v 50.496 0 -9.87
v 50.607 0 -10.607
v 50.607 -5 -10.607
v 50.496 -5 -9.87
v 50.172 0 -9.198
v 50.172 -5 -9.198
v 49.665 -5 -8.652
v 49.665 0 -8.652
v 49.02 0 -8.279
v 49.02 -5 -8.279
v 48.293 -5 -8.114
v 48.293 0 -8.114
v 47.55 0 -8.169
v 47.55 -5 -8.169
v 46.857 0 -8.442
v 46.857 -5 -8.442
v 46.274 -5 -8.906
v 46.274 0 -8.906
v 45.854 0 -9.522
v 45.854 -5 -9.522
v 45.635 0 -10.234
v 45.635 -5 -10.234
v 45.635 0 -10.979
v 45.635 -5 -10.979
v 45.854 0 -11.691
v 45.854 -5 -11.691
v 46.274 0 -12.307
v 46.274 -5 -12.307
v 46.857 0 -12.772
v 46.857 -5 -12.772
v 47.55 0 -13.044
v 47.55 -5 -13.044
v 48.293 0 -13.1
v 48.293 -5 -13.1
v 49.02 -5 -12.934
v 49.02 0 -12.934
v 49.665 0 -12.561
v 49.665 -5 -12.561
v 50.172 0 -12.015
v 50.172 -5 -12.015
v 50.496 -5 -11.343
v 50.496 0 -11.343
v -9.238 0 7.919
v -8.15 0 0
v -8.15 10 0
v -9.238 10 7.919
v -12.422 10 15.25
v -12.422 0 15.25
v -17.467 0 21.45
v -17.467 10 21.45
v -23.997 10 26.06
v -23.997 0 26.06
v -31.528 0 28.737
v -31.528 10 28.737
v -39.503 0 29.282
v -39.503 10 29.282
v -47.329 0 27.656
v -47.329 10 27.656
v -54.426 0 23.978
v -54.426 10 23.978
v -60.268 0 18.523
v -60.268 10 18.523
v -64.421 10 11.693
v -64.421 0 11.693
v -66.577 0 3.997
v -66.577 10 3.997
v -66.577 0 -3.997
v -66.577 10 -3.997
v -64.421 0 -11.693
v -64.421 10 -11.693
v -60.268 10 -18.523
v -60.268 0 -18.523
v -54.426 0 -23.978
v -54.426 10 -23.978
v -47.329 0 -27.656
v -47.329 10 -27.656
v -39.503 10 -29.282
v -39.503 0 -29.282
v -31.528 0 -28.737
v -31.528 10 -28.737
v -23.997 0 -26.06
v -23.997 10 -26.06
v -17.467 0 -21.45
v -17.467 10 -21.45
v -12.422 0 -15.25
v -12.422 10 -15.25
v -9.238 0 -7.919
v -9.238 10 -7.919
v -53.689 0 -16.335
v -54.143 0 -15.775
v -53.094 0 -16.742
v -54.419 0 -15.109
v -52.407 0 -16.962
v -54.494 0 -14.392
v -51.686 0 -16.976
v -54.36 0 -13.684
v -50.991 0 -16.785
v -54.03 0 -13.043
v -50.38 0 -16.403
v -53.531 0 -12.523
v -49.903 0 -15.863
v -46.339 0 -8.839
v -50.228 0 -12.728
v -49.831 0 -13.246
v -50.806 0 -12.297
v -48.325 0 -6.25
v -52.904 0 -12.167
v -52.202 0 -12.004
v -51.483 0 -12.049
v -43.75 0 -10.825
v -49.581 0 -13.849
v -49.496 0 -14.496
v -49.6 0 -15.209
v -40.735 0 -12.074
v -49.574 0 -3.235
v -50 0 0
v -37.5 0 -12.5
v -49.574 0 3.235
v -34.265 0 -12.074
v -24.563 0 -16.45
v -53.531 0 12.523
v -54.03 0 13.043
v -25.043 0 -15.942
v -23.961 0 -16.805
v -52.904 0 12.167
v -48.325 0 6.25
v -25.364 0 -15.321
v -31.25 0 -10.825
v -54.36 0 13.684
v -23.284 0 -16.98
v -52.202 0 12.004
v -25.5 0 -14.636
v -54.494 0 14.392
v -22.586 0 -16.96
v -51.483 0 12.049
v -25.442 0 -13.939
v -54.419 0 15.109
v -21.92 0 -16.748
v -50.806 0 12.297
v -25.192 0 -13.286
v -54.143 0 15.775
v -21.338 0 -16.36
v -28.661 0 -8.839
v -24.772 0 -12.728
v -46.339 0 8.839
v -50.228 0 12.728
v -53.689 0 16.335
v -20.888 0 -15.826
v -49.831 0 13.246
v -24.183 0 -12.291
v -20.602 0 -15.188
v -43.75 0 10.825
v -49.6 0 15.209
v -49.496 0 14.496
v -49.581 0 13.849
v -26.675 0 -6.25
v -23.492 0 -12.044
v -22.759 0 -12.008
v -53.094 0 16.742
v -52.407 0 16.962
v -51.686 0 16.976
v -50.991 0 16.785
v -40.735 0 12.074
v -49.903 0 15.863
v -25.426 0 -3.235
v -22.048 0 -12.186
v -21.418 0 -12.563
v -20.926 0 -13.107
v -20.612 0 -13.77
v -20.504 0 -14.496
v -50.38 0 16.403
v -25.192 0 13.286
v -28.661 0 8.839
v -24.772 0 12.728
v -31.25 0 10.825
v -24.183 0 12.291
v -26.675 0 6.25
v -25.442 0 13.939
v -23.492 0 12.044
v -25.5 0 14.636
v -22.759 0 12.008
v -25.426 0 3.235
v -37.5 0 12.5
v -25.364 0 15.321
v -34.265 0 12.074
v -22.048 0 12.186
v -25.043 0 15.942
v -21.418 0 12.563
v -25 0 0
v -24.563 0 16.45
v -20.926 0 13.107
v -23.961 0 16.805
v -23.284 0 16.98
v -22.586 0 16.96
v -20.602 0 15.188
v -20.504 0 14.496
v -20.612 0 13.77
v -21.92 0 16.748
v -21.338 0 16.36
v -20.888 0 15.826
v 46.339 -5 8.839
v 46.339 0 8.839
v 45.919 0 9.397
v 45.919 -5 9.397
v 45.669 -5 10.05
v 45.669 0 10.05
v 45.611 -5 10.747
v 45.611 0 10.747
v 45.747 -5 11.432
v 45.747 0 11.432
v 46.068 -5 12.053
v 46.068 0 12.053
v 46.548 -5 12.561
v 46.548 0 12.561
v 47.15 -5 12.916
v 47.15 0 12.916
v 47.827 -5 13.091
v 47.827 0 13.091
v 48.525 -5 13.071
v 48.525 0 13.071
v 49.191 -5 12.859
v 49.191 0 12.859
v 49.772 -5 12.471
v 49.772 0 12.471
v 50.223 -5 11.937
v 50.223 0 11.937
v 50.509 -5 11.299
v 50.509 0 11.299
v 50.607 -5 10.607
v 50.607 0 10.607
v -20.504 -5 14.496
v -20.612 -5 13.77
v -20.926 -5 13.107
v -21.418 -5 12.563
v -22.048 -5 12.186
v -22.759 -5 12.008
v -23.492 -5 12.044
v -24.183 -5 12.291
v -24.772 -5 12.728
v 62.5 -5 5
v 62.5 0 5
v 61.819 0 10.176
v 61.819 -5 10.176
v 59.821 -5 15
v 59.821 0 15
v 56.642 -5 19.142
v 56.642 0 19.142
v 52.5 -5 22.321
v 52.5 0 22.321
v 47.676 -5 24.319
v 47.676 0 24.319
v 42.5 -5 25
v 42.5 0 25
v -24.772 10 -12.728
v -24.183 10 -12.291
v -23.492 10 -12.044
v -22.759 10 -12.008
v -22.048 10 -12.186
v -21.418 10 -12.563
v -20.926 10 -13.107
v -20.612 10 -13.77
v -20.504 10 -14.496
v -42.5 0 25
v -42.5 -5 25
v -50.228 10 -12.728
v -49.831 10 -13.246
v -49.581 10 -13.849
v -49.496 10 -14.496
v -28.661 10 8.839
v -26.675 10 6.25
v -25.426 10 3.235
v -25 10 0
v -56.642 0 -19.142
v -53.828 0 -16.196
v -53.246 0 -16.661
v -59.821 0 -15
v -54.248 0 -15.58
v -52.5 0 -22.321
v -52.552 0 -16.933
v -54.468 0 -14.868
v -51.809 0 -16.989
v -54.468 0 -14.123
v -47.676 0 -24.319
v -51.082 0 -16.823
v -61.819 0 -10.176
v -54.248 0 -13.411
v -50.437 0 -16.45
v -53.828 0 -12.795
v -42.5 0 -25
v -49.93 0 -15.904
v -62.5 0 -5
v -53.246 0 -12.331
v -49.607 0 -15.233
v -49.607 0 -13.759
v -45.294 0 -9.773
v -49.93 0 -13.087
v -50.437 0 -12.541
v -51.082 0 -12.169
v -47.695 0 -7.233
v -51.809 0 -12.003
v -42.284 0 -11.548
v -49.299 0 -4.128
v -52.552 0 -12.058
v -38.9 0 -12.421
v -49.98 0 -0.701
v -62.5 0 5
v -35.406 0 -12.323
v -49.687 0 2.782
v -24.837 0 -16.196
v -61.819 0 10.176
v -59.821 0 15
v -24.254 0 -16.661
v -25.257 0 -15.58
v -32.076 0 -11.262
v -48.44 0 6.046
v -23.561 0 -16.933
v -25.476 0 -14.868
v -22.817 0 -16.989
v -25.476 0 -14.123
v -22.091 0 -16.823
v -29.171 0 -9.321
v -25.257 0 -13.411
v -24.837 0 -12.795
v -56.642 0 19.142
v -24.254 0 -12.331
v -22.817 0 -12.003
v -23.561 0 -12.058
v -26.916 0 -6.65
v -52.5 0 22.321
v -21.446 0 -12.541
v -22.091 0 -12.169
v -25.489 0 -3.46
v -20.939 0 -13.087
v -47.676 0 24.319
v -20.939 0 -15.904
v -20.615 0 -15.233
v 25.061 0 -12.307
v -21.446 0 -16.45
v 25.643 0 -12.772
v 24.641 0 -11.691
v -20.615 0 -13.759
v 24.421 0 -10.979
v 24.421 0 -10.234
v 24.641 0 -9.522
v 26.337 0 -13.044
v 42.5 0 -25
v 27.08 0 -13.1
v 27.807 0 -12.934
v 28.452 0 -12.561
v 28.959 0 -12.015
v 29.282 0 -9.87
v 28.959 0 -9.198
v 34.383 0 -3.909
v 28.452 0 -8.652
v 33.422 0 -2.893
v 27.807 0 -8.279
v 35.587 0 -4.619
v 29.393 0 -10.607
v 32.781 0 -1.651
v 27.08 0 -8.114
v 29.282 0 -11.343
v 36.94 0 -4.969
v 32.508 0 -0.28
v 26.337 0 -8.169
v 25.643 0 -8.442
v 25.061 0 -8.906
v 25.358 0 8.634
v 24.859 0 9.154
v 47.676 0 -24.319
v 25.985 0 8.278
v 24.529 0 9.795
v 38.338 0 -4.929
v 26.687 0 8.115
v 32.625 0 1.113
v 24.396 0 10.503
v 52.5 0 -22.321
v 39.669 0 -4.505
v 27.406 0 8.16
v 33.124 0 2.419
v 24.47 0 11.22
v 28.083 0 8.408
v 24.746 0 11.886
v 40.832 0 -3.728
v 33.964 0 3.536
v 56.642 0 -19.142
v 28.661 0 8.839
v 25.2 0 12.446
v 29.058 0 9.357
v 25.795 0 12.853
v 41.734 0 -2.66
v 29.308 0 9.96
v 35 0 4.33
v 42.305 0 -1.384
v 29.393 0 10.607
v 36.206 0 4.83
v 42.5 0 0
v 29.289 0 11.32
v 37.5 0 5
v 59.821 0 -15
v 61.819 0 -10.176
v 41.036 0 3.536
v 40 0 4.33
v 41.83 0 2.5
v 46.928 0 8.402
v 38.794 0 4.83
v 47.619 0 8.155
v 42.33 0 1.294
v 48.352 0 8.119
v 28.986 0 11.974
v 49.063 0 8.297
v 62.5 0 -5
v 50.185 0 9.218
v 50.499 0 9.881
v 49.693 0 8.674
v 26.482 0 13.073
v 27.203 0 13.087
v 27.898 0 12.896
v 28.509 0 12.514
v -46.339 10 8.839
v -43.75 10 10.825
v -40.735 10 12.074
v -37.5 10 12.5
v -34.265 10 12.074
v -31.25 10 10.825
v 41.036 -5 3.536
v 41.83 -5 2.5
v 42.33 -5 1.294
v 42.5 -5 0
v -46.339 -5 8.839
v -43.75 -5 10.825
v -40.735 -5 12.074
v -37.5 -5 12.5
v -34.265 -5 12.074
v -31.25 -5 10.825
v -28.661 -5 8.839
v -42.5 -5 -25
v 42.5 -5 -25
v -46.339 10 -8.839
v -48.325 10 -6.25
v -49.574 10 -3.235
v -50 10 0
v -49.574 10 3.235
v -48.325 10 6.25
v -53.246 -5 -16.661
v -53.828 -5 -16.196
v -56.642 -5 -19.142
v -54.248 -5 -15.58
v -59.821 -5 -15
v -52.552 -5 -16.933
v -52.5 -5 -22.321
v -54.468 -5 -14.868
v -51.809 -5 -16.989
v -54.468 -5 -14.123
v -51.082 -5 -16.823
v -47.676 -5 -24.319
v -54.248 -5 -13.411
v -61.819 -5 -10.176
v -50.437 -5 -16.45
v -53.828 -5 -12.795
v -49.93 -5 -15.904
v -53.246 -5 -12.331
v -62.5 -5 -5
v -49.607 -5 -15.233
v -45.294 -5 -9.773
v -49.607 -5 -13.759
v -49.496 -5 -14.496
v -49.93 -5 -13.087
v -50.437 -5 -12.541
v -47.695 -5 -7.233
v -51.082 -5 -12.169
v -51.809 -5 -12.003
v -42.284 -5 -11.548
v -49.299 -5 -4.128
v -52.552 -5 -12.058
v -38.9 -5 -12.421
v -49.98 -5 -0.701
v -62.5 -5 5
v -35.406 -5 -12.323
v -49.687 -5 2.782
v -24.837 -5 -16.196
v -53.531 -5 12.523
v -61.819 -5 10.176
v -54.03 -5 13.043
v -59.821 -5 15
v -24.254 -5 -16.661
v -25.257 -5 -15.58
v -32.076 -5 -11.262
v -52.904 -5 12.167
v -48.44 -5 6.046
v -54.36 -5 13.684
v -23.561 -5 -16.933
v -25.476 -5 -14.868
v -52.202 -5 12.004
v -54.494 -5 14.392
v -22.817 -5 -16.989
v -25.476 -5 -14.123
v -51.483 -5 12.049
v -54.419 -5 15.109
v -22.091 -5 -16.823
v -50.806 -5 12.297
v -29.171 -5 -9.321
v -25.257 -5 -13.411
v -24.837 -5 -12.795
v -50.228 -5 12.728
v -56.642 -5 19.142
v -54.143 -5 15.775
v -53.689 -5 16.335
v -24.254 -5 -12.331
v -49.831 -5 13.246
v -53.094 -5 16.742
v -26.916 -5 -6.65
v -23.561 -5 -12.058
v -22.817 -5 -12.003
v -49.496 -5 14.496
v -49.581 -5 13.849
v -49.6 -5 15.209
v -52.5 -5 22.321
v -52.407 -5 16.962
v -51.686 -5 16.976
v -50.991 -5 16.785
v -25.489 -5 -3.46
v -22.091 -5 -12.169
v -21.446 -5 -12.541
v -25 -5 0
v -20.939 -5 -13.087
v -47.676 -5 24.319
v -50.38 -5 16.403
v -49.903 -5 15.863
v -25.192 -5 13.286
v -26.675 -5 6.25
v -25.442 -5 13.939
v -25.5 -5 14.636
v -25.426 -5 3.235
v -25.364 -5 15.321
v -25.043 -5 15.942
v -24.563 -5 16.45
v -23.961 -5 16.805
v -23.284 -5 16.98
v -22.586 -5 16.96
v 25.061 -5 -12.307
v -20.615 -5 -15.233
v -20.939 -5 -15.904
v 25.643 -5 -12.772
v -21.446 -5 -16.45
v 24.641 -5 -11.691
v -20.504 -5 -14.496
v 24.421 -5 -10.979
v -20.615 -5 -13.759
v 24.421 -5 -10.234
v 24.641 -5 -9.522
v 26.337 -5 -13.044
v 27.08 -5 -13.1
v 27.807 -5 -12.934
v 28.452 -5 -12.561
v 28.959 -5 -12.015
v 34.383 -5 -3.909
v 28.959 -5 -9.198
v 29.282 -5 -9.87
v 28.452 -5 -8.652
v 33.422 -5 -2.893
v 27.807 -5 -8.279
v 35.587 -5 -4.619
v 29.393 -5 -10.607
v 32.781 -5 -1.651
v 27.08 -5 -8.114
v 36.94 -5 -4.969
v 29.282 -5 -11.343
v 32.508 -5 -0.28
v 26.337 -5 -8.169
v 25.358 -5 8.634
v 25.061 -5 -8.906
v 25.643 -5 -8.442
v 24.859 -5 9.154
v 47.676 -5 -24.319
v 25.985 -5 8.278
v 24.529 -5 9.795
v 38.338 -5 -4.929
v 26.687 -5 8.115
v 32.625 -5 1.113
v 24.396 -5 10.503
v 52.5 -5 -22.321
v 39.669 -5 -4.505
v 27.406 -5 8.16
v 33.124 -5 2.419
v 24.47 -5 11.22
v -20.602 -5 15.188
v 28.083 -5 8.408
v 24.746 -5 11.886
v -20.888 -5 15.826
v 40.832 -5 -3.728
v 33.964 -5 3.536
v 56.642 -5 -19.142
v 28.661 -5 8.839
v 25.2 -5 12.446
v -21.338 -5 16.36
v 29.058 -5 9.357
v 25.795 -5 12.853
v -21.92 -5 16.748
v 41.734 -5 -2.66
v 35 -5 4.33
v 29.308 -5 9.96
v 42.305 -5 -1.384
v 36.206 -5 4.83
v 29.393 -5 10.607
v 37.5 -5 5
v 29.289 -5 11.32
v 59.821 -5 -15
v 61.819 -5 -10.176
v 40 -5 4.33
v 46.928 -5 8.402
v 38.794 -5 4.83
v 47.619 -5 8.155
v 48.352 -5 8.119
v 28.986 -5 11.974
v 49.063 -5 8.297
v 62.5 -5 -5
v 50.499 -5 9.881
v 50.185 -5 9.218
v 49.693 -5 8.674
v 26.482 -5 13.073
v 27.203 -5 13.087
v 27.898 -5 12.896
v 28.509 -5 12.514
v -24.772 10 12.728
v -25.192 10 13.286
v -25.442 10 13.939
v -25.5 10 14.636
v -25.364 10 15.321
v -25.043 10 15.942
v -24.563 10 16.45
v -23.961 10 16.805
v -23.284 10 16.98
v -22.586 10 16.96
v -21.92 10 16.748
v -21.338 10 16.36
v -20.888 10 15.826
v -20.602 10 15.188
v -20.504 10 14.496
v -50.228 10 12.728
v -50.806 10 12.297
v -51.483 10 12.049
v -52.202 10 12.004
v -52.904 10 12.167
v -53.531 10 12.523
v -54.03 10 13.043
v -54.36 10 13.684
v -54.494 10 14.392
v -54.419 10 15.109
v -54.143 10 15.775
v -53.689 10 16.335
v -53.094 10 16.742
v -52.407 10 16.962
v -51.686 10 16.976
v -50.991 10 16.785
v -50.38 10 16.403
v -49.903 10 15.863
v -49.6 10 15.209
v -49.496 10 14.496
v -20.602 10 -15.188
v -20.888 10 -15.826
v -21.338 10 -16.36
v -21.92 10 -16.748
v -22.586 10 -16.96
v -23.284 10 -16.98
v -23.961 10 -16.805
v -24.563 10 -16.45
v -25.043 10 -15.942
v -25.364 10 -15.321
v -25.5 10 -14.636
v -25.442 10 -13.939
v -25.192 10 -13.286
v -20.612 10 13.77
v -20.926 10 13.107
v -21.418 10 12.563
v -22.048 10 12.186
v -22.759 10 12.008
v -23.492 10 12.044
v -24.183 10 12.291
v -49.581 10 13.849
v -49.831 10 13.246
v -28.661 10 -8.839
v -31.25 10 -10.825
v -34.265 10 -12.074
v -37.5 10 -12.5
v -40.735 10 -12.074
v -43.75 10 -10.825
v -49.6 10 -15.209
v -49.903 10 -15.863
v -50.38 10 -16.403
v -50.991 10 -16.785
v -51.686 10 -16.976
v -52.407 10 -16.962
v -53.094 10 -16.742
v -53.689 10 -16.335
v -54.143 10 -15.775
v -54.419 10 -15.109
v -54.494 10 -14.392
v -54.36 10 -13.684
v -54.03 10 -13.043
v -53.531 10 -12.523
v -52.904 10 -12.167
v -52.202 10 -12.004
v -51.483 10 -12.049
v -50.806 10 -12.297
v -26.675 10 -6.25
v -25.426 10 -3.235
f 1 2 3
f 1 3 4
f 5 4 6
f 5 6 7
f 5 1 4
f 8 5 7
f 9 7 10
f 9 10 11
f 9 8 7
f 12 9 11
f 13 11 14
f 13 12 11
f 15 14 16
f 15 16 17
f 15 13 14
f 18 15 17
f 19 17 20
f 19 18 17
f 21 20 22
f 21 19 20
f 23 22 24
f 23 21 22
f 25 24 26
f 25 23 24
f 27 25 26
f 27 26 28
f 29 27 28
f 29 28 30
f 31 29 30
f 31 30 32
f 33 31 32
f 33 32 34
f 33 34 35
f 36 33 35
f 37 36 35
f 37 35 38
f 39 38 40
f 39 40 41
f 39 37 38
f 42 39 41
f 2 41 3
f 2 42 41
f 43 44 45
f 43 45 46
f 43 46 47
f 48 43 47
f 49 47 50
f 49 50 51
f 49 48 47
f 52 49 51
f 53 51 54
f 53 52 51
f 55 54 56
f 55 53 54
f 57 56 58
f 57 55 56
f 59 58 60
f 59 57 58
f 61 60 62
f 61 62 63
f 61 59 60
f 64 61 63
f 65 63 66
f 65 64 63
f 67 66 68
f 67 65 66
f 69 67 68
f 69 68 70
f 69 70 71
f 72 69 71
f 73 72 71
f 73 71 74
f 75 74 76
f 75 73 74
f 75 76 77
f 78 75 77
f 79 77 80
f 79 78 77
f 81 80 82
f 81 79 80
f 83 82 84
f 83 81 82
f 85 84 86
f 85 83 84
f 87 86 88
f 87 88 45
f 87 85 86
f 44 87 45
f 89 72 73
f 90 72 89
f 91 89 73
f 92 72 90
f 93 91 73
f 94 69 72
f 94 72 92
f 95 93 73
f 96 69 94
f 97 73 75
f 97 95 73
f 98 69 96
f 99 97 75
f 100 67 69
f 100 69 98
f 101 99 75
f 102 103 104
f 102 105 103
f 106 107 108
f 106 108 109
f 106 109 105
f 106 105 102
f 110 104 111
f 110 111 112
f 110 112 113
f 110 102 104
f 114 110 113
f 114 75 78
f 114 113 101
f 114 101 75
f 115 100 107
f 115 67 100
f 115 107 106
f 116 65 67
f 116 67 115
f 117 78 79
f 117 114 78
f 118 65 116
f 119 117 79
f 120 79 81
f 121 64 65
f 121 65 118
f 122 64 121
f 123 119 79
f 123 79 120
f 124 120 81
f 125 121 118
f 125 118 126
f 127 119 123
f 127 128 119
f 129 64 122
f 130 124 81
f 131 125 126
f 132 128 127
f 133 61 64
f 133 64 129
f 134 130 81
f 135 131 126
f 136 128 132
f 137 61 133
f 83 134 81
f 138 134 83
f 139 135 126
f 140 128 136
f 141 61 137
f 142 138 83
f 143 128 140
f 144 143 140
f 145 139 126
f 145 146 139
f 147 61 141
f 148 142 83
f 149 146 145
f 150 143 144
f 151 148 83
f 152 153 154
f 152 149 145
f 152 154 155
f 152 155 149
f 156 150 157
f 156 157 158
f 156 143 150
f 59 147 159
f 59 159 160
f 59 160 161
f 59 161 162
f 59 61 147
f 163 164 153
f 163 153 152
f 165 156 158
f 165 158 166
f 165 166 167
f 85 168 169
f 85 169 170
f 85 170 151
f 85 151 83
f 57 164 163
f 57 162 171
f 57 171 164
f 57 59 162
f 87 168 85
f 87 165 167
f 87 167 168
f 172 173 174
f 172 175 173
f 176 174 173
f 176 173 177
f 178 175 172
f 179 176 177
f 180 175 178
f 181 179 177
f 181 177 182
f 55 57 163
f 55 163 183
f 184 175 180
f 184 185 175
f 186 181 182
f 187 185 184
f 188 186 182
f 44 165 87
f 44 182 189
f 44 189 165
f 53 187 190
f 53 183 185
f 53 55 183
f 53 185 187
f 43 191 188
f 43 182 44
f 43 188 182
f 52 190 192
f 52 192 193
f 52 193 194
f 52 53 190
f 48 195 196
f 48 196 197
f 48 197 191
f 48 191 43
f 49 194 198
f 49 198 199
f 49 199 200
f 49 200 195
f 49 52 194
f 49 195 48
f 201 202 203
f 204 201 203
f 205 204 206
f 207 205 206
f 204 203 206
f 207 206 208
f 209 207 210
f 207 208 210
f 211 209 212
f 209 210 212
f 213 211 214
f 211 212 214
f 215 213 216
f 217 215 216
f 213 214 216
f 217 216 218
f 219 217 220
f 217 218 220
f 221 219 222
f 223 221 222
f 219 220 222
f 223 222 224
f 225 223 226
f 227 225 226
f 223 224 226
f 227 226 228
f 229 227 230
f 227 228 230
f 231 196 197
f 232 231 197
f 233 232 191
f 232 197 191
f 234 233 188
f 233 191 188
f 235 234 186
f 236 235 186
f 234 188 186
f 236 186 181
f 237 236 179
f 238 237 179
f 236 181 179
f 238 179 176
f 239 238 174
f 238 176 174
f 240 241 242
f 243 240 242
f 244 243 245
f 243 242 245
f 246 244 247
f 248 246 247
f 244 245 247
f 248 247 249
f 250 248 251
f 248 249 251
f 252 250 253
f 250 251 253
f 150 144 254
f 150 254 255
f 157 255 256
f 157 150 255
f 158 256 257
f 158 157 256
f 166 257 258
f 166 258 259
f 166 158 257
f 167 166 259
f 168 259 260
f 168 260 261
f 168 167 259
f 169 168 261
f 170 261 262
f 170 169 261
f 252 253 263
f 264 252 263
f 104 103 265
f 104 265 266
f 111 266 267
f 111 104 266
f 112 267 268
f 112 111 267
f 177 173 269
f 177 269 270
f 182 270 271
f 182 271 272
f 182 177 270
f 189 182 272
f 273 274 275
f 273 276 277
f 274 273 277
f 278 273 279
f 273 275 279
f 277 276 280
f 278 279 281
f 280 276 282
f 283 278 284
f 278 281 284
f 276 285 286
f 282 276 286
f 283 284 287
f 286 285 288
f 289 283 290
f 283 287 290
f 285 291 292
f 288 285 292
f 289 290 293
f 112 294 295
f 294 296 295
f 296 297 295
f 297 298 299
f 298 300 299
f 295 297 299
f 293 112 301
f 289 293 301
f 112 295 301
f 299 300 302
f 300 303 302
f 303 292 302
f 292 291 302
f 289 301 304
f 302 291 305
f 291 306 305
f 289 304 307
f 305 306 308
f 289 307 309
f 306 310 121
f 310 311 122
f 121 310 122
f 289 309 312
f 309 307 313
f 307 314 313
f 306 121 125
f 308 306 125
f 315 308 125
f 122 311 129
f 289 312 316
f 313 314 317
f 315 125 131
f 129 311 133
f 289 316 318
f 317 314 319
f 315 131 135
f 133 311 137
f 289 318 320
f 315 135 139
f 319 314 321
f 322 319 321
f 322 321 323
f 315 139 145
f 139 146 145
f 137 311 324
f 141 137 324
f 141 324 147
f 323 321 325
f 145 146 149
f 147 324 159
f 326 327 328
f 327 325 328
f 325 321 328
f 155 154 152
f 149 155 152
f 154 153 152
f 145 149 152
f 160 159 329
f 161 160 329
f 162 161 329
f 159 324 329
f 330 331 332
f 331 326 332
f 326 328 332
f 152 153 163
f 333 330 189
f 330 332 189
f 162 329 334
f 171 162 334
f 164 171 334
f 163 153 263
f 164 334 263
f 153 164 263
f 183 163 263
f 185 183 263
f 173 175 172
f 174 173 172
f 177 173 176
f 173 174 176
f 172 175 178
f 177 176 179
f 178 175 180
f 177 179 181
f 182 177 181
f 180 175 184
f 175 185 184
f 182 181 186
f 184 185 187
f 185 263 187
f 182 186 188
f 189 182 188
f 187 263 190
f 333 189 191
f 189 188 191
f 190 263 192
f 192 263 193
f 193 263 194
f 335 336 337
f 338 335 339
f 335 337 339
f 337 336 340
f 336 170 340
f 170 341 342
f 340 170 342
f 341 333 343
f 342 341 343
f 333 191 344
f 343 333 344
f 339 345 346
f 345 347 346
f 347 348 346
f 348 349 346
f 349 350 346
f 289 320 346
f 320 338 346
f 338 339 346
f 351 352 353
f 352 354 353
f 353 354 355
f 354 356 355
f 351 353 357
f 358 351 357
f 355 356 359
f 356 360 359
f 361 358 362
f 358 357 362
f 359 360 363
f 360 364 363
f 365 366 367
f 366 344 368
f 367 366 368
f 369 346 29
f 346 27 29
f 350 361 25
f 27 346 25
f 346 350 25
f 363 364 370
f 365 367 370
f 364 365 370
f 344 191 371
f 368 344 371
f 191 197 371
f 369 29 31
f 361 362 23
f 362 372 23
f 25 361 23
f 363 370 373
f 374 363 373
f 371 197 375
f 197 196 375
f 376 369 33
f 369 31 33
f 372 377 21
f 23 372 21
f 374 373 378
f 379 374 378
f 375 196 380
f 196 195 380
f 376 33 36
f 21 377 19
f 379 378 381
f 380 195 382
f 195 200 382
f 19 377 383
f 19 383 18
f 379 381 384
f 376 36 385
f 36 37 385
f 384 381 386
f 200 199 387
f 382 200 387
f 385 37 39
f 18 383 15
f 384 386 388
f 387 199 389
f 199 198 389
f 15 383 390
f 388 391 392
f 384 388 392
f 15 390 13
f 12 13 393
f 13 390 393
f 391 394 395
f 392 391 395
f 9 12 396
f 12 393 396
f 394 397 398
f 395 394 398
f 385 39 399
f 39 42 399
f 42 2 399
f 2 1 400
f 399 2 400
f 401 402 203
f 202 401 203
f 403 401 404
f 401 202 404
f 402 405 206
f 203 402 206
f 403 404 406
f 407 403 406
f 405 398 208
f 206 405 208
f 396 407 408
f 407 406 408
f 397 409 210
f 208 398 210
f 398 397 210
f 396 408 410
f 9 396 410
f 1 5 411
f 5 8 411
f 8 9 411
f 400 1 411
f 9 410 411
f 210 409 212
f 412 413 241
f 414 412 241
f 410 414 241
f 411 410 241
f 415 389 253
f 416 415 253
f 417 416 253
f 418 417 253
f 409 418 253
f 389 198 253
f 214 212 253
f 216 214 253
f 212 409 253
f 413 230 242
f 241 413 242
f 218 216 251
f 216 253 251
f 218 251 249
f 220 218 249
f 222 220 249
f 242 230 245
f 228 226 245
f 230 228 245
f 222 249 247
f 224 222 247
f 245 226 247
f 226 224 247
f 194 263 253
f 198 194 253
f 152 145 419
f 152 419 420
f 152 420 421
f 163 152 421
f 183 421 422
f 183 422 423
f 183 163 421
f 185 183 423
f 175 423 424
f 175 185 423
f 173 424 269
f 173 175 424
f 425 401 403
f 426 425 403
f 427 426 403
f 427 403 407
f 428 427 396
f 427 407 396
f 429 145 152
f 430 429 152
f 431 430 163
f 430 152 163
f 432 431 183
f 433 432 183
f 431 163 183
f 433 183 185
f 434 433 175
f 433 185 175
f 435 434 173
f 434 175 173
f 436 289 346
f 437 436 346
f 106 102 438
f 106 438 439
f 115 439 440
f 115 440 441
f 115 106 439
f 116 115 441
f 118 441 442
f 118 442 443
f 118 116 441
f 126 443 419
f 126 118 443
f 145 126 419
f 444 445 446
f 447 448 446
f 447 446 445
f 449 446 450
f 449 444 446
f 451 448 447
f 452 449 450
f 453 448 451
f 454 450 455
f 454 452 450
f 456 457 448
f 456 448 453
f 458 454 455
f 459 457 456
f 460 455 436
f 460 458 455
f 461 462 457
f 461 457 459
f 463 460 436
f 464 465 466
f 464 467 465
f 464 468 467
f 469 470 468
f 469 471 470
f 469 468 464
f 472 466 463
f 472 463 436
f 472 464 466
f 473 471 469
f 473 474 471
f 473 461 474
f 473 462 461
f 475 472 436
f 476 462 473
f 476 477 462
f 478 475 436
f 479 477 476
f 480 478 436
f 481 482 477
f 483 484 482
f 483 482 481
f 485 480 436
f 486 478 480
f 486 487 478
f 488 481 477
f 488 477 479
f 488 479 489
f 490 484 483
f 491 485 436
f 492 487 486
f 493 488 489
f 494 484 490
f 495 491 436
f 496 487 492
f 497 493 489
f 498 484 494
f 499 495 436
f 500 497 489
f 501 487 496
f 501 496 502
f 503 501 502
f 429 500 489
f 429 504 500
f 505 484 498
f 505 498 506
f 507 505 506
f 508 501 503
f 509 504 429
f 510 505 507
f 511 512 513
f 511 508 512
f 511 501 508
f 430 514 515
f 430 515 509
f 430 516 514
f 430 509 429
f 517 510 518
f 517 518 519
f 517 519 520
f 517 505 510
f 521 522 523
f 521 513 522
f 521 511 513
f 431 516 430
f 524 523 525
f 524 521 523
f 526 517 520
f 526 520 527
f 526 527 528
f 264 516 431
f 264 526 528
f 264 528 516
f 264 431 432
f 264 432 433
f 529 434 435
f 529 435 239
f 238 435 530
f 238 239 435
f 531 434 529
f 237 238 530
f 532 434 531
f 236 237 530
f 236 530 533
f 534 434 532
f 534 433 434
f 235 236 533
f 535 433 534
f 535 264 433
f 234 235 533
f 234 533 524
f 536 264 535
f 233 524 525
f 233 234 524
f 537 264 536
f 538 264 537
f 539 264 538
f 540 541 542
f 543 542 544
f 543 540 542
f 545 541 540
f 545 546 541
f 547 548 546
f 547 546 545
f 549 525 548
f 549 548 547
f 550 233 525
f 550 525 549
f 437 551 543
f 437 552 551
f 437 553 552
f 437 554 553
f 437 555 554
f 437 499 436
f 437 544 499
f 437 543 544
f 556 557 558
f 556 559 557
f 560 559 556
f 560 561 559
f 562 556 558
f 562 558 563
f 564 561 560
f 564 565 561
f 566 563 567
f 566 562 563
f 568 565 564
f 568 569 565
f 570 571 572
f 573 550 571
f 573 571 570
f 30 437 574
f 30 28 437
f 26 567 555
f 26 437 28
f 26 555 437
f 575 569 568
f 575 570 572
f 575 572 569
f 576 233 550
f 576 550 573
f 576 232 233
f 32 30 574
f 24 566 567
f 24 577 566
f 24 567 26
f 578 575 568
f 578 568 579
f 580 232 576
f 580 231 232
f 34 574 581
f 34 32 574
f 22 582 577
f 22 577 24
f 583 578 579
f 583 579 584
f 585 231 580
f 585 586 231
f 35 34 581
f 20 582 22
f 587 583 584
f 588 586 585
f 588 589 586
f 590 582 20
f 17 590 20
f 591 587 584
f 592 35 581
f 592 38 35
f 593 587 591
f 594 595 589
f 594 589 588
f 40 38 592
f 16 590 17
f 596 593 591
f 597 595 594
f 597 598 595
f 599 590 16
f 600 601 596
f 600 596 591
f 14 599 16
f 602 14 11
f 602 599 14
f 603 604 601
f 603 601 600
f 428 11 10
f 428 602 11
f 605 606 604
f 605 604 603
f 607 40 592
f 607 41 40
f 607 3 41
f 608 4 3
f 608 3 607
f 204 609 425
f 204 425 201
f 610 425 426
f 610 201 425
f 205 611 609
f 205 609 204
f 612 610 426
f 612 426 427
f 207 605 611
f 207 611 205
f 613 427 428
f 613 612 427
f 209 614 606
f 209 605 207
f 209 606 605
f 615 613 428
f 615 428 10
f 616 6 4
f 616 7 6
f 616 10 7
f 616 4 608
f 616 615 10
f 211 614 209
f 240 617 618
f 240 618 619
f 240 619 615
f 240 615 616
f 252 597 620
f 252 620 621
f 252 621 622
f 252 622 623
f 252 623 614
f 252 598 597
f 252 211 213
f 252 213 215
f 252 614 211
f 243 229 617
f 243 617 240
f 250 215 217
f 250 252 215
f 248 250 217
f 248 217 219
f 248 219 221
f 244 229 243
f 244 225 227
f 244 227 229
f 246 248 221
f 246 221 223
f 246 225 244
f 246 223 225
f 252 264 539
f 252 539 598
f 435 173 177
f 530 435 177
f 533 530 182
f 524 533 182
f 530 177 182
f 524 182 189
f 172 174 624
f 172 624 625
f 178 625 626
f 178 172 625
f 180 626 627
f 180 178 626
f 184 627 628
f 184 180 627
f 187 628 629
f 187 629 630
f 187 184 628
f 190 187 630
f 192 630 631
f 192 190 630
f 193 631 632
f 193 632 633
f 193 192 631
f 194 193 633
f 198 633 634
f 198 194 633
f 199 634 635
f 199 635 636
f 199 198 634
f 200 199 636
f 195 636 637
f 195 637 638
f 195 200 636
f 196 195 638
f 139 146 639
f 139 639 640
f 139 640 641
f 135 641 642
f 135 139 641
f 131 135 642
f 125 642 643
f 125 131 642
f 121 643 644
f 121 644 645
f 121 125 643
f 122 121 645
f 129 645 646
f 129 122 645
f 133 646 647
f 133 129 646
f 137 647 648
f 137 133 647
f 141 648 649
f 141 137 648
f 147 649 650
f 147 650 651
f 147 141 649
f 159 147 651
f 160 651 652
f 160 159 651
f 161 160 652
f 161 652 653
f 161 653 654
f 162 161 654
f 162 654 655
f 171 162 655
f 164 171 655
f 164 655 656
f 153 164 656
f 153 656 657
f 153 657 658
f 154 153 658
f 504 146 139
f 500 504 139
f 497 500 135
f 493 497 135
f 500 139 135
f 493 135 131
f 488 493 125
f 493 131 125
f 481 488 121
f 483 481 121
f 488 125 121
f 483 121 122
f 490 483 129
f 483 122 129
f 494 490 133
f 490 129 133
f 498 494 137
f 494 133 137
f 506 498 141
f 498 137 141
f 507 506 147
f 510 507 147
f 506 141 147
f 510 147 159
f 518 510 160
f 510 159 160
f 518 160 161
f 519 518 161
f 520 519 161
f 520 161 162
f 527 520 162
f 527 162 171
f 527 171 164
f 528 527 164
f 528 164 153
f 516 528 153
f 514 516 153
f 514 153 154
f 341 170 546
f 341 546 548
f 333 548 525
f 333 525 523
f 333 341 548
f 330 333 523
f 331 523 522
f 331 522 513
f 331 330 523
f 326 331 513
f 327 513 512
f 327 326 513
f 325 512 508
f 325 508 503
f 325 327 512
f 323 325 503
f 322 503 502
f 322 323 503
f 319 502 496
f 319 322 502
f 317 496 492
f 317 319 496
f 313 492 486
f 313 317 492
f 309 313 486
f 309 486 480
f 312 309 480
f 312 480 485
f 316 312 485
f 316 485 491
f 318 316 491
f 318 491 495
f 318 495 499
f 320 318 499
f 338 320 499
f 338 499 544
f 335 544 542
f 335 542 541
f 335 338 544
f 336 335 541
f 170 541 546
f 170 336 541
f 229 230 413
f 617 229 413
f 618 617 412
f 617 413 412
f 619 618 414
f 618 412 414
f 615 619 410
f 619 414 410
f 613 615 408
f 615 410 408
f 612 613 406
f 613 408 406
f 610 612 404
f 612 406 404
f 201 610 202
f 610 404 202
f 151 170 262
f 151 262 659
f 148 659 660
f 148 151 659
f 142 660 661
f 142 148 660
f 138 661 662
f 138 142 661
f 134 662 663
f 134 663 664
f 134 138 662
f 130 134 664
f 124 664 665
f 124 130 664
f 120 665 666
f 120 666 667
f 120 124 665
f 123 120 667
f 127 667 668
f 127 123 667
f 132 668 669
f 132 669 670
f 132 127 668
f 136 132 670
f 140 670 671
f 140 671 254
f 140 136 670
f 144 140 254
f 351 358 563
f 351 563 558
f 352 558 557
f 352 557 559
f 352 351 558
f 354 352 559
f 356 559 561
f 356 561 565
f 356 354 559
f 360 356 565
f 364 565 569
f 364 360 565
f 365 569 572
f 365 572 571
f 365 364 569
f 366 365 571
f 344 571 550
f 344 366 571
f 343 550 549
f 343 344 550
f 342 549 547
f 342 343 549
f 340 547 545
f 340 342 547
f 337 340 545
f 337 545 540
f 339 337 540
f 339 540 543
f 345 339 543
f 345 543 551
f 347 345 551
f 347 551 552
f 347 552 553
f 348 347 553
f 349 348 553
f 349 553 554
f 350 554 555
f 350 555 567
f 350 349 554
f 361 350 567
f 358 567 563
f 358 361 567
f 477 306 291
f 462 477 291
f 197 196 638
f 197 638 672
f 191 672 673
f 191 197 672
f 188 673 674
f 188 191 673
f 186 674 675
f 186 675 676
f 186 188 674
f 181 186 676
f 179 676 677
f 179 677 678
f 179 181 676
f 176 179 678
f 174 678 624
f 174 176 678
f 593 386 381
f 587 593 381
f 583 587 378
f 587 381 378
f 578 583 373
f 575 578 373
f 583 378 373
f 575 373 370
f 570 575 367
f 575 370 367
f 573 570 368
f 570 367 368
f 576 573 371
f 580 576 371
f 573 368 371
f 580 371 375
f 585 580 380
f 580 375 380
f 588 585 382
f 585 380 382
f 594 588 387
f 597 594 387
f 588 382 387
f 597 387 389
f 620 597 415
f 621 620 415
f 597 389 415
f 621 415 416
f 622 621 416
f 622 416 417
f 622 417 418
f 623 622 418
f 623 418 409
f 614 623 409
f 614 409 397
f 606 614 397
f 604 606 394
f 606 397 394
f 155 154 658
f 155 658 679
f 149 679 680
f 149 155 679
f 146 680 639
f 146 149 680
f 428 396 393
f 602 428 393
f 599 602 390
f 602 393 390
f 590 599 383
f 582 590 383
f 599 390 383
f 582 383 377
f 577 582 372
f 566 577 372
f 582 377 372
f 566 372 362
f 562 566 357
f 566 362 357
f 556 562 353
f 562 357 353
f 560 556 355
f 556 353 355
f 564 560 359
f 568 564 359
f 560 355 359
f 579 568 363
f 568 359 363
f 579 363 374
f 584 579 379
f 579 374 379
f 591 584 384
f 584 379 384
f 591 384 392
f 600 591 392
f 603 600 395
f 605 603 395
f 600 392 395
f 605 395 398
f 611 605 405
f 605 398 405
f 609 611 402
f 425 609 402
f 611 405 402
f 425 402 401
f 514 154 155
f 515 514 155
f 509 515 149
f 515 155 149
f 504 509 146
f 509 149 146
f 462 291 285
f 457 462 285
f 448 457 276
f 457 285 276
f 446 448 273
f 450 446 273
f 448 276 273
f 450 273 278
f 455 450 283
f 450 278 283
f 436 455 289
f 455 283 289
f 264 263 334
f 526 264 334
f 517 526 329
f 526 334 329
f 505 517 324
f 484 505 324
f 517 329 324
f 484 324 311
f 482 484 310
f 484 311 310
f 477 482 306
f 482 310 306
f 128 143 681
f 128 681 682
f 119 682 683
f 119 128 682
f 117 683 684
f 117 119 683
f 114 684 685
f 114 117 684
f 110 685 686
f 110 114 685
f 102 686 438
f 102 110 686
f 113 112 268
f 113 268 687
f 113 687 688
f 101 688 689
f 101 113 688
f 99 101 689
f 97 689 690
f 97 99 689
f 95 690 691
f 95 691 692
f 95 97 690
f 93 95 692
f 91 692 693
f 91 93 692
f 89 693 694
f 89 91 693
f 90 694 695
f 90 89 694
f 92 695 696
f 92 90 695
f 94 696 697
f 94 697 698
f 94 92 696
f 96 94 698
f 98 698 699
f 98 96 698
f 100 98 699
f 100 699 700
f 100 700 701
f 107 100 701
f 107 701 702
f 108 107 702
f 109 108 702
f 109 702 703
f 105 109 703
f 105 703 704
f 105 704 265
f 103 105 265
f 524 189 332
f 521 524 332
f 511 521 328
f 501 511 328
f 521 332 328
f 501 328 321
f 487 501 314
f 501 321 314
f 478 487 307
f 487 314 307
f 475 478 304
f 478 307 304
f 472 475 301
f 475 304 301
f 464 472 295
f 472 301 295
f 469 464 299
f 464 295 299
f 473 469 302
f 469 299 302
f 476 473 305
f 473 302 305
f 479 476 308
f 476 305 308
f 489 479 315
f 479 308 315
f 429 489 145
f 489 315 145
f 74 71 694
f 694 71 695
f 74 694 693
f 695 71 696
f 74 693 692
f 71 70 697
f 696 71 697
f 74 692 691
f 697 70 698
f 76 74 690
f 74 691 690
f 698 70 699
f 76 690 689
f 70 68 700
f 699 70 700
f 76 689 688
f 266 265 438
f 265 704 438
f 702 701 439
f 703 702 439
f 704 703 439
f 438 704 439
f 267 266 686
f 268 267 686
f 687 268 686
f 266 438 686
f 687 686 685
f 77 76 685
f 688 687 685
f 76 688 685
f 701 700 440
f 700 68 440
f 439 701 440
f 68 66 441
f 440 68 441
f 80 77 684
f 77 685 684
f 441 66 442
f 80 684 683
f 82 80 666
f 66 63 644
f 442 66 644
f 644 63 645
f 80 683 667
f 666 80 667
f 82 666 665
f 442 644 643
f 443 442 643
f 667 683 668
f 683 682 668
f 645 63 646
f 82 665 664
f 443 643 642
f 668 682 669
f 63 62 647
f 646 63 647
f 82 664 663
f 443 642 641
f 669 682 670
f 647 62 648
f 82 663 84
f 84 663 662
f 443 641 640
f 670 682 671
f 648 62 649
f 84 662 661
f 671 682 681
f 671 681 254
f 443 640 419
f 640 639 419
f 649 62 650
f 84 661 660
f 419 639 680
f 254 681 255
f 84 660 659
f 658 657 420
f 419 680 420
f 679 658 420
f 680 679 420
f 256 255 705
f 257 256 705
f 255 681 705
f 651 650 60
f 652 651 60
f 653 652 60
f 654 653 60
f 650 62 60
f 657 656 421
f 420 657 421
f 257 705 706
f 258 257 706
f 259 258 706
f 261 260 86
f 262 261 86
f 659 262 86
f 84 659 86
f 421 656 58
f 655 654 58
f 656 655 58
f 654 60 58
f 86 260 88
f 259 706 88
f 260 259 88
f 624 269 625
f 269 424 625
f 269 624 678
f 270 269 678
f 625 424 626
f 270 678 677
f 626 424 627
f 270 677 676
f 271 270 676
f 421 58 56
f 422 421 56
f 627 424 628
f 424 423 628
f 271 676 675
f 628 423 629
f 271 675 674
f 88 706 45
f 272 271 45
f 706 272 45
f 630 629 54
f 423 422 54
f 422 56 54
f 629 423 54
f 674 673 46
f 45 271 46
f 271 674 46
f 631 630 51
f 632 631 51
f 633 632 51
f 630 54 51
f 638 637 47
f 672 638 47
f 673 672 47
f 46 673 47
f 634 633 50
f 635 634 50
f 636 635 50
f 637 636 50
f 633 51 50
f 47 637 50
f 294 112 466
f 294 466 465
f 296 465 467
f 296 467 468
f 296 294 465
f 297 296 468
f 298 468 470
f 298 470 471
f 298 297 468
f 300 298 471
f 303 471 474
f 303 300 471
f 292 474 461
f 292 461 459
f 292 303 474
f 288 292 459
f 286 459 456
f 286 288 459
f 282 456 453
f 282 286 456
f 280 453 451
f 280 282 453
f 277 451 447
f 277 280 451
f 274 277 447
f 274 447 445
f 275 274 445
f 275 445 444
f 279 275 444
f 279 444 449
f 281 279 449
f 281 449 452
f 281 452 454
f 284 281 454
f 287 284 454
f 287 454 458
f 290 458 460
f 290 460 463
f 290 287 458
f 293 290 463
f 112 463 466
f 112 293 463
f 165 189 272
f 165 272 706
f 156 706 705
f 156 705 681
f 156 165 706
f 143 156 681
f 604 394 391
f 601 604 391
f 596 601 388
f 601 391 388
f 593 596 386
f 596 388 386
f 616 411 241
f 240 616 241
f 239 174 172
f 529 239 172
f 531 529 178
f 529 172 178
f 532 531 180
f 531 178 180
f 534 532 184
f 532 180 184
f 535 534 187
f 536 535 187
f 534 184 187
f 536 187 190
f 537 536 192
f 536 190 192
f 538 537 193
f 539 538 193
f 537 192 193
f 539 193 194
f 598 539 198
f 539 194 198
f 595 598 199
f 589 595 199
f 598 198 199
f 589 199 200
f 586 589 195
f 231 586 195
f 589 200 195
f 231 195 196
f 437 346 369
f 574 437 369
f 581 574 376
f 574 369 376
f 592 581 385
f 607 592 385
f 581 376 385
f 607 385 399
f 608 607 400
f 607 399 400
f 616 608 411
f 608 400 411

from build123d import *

# Parameters (mm, degrees)
F0_R     = 2.5
F1_DEPTH = 5
F2_R     = 29.3505
F3_DEPTH = 10


with BuildPart() as f1:
    # F0 (on Front) → F1 (new body)
    with BuildSketch(Plane.XZ):
        with BuildLine():
            ThreePointArc((62.5, 5), (56.6421356237, 19.1421356237), (42.5, 25))
            Line((42.5, 25), (-42.5, 25))
            ThreePointArc((-42.5, 25), (-56.6421356237, 19.1421356237), (-62.5, 5))
            Line((-62.5, 5), (-62.5, -5))
            ThreePointArc((-62.5, -5), (-56.6421356237, -19.1421356237), (-42.5, -25))
            Line((-42.5, -25), (42.5, -25))
            ThreePointArc((42.5, -25), (56.6421356237, -19.1421356237), (62.5, -5))
            Line((62.5, -5), (62.5, 5))
        make_face()
        with Locations((-51.9956890143, -14.4956890143)):
            Circle(F0_R, mode=Mode.SUBTRACT)
        with Locations((-23.0043109857, -14.4956890143)):
            Circle(F0_R, mode=Mode.SUBTRACT)
        with BuildLine():
            ThreePointArc((-25, 0), (-42.2835429046, -11.5484941564), (-46.3388347648, 8.8388347648))
            ThreePointArc((-46.3388347648, 8.8388347648), (-37.5, 12.5), (-28.6611652352, 8.8388347648))
            ThreePointArc((-28.6611652352, 8.8388347648), (-25.9515058436, 4.7835429046), (-25, 0))
        make_face(mode=Mode.SUBTRACT)
        with Locations((26.8933982822, -10.6066017178)):
            Circle(F0_R, mode=Mode.SUBTRACT)
        with Locations((48.1066017178, -10.6066017178)):
            Circle(F0_R, mode=Mode.SUBTRACT)
        with BuildLine():
            ThreePointArc((42.5, 0), (35.5865828382, -4.6193976626), (33.9644660941, 3.5355339059))
            ThreePointArc((33.9644660941, 3.5355339059), (37.5, 5), (41.0355339059, 3.5355339059))
            ThreePointArc((41.0355339059, 3.5355339059), (42.1193976626, 1.9134171618), (42.5, 0))
        make_face(mode=Mode.SUBTRACT)
        with BuildLine():
            ThreePointArc((-50.2279220614, 12.7279220614), (-54.3053878456, 15.4523975952), (-49.4956890143, 14.4956890143))
            ThreePointArc((-49.4956890143, 14.4956890143), (-49.685990183, 13.5389804334), (-50.2279220614, 12.7279220614))
        make_face(mode=Mode.SUBTRACT)
        with BuildLine():
            ThreePointArc((-20.5043109857, 14.4956890143), (-22.0476024048, 12.185990183), (-24.7720779386, 12.7279220614))
            ThreePointArc((-24.7720779386, 12.7279220614), (-23.9610195666, 16.8053878456), (-20.5043109857, 14.4956890143))
        make_face(mode=Mode.SUBTRACT)
        with BuildLine():
            ThreePointArc((28.6611652352, 8.8388347648), (24.5836994509, 11.5633102987), (29.3933982822, 10.6066017178))
            ThreePointArc((29.3933982822, 10.6066017178), (29.2030971135, 9.6498931369), (28.6611652352, 8.8388347648))
        make_face(mode=Mode.SUBTRACT)
        with BuildLine():
            ThreePointArc((50.6066017178, 10.6066017178), (49.0633102987, 8.2969028865), (46.3388347648, 8.8388347648))
            ThreePointArc((46.3388347648, 8.8388347648), (47.1498931369, 12.9163005491), (50.6066017178, 10.6066017178))
        make_face(mode=Mode.SUBTRACT)
    extrude(amount=F1_DEPTH)


with BuildPart() as f3:
    # F2 (on Front) → F3 (new body)
    with BuildSketch(Plane.XZ):
        with Locations((-37.5, 0)):
            Circle(F2_R)
        with BuildLine():
            ThreePointArc((-49.4956890143, -14.4956890143), (-54.3053878456, -15.4523975952), (-50.2279220614, -12.7279220614))
            ThreePointArc((-50.2279220614, -12.7279220614), (-49.685990183, -13.5389804334), (-49.4956890143, -14.4956890143))
        make_face(mode=Mode.SUBTRACT)
        with BuildLine():
            ThreePointArc((-20.5043109857, -14.4956890143), (-23.9610195666, -16.8053878456), (-24.7720779386, -12.7279220614))
            ThreePointArc((-24.7720779386, -12.7279220614), (-22.0476024048, -12.185990183), (-20.5043109857, -14.4956890143))
        make_face(mode=Mode.SUBTRACT)
        with BuildLine():
            ThreePointArc((-50.2279220614, 12.7279220614), (-54.3053878456, 15.4523975952), (-49.4956890143, 14.4956890143))
            ThreePointArc((-49.4956890143, 14.4956890143), (-49.685990183, 13.5389804334), (-50.2279220614, 12.7279220614))
        make_face(mode=Mode.SUBTRACT)
        with BuildLine():
            ThreePointArc((-46.3388347648, -8.8388347648), (-50, 0), (-46.3388347648, 8.8388347648))
            ThreePointArc((-46.3388347648, 8.8388347648), (-37.5, 12.5), (-28.6611652352, 8.8388347648))
            ThreePointArc((-28.6611652352, 8.8388347648), (-25.9515058436, 4.7835429046), (-25, 0))
            ThreePointArc((-25, 0), (-25.9515058436, -4.7835429046), (-28.6611652352, -8.8388347648))
            ThreePointArc((-28.6611652352, -8.8388347648), (-37.5, -12.5), (-46.3388347648, -8.8388347648))
        make_face(mode=Mode.SUBTRACT)
        with BuildLine():
            ThreePointArc((-20.5043109857, 14.4956890143), (-22.0476024048, 12.185990183), (-24.7720779386, 12.7279220614))
            ThreePointArc((-24.7720779386, 12.7279220614), (-23.9610195666, 16.8053878456), (-20.5043109857, 14.4956890143))
        make_face(mode=Mode.SUBTRACT)
    extrude(amount=-F3_DEPTH)


solid = Compound([f1.part, f3.part])
